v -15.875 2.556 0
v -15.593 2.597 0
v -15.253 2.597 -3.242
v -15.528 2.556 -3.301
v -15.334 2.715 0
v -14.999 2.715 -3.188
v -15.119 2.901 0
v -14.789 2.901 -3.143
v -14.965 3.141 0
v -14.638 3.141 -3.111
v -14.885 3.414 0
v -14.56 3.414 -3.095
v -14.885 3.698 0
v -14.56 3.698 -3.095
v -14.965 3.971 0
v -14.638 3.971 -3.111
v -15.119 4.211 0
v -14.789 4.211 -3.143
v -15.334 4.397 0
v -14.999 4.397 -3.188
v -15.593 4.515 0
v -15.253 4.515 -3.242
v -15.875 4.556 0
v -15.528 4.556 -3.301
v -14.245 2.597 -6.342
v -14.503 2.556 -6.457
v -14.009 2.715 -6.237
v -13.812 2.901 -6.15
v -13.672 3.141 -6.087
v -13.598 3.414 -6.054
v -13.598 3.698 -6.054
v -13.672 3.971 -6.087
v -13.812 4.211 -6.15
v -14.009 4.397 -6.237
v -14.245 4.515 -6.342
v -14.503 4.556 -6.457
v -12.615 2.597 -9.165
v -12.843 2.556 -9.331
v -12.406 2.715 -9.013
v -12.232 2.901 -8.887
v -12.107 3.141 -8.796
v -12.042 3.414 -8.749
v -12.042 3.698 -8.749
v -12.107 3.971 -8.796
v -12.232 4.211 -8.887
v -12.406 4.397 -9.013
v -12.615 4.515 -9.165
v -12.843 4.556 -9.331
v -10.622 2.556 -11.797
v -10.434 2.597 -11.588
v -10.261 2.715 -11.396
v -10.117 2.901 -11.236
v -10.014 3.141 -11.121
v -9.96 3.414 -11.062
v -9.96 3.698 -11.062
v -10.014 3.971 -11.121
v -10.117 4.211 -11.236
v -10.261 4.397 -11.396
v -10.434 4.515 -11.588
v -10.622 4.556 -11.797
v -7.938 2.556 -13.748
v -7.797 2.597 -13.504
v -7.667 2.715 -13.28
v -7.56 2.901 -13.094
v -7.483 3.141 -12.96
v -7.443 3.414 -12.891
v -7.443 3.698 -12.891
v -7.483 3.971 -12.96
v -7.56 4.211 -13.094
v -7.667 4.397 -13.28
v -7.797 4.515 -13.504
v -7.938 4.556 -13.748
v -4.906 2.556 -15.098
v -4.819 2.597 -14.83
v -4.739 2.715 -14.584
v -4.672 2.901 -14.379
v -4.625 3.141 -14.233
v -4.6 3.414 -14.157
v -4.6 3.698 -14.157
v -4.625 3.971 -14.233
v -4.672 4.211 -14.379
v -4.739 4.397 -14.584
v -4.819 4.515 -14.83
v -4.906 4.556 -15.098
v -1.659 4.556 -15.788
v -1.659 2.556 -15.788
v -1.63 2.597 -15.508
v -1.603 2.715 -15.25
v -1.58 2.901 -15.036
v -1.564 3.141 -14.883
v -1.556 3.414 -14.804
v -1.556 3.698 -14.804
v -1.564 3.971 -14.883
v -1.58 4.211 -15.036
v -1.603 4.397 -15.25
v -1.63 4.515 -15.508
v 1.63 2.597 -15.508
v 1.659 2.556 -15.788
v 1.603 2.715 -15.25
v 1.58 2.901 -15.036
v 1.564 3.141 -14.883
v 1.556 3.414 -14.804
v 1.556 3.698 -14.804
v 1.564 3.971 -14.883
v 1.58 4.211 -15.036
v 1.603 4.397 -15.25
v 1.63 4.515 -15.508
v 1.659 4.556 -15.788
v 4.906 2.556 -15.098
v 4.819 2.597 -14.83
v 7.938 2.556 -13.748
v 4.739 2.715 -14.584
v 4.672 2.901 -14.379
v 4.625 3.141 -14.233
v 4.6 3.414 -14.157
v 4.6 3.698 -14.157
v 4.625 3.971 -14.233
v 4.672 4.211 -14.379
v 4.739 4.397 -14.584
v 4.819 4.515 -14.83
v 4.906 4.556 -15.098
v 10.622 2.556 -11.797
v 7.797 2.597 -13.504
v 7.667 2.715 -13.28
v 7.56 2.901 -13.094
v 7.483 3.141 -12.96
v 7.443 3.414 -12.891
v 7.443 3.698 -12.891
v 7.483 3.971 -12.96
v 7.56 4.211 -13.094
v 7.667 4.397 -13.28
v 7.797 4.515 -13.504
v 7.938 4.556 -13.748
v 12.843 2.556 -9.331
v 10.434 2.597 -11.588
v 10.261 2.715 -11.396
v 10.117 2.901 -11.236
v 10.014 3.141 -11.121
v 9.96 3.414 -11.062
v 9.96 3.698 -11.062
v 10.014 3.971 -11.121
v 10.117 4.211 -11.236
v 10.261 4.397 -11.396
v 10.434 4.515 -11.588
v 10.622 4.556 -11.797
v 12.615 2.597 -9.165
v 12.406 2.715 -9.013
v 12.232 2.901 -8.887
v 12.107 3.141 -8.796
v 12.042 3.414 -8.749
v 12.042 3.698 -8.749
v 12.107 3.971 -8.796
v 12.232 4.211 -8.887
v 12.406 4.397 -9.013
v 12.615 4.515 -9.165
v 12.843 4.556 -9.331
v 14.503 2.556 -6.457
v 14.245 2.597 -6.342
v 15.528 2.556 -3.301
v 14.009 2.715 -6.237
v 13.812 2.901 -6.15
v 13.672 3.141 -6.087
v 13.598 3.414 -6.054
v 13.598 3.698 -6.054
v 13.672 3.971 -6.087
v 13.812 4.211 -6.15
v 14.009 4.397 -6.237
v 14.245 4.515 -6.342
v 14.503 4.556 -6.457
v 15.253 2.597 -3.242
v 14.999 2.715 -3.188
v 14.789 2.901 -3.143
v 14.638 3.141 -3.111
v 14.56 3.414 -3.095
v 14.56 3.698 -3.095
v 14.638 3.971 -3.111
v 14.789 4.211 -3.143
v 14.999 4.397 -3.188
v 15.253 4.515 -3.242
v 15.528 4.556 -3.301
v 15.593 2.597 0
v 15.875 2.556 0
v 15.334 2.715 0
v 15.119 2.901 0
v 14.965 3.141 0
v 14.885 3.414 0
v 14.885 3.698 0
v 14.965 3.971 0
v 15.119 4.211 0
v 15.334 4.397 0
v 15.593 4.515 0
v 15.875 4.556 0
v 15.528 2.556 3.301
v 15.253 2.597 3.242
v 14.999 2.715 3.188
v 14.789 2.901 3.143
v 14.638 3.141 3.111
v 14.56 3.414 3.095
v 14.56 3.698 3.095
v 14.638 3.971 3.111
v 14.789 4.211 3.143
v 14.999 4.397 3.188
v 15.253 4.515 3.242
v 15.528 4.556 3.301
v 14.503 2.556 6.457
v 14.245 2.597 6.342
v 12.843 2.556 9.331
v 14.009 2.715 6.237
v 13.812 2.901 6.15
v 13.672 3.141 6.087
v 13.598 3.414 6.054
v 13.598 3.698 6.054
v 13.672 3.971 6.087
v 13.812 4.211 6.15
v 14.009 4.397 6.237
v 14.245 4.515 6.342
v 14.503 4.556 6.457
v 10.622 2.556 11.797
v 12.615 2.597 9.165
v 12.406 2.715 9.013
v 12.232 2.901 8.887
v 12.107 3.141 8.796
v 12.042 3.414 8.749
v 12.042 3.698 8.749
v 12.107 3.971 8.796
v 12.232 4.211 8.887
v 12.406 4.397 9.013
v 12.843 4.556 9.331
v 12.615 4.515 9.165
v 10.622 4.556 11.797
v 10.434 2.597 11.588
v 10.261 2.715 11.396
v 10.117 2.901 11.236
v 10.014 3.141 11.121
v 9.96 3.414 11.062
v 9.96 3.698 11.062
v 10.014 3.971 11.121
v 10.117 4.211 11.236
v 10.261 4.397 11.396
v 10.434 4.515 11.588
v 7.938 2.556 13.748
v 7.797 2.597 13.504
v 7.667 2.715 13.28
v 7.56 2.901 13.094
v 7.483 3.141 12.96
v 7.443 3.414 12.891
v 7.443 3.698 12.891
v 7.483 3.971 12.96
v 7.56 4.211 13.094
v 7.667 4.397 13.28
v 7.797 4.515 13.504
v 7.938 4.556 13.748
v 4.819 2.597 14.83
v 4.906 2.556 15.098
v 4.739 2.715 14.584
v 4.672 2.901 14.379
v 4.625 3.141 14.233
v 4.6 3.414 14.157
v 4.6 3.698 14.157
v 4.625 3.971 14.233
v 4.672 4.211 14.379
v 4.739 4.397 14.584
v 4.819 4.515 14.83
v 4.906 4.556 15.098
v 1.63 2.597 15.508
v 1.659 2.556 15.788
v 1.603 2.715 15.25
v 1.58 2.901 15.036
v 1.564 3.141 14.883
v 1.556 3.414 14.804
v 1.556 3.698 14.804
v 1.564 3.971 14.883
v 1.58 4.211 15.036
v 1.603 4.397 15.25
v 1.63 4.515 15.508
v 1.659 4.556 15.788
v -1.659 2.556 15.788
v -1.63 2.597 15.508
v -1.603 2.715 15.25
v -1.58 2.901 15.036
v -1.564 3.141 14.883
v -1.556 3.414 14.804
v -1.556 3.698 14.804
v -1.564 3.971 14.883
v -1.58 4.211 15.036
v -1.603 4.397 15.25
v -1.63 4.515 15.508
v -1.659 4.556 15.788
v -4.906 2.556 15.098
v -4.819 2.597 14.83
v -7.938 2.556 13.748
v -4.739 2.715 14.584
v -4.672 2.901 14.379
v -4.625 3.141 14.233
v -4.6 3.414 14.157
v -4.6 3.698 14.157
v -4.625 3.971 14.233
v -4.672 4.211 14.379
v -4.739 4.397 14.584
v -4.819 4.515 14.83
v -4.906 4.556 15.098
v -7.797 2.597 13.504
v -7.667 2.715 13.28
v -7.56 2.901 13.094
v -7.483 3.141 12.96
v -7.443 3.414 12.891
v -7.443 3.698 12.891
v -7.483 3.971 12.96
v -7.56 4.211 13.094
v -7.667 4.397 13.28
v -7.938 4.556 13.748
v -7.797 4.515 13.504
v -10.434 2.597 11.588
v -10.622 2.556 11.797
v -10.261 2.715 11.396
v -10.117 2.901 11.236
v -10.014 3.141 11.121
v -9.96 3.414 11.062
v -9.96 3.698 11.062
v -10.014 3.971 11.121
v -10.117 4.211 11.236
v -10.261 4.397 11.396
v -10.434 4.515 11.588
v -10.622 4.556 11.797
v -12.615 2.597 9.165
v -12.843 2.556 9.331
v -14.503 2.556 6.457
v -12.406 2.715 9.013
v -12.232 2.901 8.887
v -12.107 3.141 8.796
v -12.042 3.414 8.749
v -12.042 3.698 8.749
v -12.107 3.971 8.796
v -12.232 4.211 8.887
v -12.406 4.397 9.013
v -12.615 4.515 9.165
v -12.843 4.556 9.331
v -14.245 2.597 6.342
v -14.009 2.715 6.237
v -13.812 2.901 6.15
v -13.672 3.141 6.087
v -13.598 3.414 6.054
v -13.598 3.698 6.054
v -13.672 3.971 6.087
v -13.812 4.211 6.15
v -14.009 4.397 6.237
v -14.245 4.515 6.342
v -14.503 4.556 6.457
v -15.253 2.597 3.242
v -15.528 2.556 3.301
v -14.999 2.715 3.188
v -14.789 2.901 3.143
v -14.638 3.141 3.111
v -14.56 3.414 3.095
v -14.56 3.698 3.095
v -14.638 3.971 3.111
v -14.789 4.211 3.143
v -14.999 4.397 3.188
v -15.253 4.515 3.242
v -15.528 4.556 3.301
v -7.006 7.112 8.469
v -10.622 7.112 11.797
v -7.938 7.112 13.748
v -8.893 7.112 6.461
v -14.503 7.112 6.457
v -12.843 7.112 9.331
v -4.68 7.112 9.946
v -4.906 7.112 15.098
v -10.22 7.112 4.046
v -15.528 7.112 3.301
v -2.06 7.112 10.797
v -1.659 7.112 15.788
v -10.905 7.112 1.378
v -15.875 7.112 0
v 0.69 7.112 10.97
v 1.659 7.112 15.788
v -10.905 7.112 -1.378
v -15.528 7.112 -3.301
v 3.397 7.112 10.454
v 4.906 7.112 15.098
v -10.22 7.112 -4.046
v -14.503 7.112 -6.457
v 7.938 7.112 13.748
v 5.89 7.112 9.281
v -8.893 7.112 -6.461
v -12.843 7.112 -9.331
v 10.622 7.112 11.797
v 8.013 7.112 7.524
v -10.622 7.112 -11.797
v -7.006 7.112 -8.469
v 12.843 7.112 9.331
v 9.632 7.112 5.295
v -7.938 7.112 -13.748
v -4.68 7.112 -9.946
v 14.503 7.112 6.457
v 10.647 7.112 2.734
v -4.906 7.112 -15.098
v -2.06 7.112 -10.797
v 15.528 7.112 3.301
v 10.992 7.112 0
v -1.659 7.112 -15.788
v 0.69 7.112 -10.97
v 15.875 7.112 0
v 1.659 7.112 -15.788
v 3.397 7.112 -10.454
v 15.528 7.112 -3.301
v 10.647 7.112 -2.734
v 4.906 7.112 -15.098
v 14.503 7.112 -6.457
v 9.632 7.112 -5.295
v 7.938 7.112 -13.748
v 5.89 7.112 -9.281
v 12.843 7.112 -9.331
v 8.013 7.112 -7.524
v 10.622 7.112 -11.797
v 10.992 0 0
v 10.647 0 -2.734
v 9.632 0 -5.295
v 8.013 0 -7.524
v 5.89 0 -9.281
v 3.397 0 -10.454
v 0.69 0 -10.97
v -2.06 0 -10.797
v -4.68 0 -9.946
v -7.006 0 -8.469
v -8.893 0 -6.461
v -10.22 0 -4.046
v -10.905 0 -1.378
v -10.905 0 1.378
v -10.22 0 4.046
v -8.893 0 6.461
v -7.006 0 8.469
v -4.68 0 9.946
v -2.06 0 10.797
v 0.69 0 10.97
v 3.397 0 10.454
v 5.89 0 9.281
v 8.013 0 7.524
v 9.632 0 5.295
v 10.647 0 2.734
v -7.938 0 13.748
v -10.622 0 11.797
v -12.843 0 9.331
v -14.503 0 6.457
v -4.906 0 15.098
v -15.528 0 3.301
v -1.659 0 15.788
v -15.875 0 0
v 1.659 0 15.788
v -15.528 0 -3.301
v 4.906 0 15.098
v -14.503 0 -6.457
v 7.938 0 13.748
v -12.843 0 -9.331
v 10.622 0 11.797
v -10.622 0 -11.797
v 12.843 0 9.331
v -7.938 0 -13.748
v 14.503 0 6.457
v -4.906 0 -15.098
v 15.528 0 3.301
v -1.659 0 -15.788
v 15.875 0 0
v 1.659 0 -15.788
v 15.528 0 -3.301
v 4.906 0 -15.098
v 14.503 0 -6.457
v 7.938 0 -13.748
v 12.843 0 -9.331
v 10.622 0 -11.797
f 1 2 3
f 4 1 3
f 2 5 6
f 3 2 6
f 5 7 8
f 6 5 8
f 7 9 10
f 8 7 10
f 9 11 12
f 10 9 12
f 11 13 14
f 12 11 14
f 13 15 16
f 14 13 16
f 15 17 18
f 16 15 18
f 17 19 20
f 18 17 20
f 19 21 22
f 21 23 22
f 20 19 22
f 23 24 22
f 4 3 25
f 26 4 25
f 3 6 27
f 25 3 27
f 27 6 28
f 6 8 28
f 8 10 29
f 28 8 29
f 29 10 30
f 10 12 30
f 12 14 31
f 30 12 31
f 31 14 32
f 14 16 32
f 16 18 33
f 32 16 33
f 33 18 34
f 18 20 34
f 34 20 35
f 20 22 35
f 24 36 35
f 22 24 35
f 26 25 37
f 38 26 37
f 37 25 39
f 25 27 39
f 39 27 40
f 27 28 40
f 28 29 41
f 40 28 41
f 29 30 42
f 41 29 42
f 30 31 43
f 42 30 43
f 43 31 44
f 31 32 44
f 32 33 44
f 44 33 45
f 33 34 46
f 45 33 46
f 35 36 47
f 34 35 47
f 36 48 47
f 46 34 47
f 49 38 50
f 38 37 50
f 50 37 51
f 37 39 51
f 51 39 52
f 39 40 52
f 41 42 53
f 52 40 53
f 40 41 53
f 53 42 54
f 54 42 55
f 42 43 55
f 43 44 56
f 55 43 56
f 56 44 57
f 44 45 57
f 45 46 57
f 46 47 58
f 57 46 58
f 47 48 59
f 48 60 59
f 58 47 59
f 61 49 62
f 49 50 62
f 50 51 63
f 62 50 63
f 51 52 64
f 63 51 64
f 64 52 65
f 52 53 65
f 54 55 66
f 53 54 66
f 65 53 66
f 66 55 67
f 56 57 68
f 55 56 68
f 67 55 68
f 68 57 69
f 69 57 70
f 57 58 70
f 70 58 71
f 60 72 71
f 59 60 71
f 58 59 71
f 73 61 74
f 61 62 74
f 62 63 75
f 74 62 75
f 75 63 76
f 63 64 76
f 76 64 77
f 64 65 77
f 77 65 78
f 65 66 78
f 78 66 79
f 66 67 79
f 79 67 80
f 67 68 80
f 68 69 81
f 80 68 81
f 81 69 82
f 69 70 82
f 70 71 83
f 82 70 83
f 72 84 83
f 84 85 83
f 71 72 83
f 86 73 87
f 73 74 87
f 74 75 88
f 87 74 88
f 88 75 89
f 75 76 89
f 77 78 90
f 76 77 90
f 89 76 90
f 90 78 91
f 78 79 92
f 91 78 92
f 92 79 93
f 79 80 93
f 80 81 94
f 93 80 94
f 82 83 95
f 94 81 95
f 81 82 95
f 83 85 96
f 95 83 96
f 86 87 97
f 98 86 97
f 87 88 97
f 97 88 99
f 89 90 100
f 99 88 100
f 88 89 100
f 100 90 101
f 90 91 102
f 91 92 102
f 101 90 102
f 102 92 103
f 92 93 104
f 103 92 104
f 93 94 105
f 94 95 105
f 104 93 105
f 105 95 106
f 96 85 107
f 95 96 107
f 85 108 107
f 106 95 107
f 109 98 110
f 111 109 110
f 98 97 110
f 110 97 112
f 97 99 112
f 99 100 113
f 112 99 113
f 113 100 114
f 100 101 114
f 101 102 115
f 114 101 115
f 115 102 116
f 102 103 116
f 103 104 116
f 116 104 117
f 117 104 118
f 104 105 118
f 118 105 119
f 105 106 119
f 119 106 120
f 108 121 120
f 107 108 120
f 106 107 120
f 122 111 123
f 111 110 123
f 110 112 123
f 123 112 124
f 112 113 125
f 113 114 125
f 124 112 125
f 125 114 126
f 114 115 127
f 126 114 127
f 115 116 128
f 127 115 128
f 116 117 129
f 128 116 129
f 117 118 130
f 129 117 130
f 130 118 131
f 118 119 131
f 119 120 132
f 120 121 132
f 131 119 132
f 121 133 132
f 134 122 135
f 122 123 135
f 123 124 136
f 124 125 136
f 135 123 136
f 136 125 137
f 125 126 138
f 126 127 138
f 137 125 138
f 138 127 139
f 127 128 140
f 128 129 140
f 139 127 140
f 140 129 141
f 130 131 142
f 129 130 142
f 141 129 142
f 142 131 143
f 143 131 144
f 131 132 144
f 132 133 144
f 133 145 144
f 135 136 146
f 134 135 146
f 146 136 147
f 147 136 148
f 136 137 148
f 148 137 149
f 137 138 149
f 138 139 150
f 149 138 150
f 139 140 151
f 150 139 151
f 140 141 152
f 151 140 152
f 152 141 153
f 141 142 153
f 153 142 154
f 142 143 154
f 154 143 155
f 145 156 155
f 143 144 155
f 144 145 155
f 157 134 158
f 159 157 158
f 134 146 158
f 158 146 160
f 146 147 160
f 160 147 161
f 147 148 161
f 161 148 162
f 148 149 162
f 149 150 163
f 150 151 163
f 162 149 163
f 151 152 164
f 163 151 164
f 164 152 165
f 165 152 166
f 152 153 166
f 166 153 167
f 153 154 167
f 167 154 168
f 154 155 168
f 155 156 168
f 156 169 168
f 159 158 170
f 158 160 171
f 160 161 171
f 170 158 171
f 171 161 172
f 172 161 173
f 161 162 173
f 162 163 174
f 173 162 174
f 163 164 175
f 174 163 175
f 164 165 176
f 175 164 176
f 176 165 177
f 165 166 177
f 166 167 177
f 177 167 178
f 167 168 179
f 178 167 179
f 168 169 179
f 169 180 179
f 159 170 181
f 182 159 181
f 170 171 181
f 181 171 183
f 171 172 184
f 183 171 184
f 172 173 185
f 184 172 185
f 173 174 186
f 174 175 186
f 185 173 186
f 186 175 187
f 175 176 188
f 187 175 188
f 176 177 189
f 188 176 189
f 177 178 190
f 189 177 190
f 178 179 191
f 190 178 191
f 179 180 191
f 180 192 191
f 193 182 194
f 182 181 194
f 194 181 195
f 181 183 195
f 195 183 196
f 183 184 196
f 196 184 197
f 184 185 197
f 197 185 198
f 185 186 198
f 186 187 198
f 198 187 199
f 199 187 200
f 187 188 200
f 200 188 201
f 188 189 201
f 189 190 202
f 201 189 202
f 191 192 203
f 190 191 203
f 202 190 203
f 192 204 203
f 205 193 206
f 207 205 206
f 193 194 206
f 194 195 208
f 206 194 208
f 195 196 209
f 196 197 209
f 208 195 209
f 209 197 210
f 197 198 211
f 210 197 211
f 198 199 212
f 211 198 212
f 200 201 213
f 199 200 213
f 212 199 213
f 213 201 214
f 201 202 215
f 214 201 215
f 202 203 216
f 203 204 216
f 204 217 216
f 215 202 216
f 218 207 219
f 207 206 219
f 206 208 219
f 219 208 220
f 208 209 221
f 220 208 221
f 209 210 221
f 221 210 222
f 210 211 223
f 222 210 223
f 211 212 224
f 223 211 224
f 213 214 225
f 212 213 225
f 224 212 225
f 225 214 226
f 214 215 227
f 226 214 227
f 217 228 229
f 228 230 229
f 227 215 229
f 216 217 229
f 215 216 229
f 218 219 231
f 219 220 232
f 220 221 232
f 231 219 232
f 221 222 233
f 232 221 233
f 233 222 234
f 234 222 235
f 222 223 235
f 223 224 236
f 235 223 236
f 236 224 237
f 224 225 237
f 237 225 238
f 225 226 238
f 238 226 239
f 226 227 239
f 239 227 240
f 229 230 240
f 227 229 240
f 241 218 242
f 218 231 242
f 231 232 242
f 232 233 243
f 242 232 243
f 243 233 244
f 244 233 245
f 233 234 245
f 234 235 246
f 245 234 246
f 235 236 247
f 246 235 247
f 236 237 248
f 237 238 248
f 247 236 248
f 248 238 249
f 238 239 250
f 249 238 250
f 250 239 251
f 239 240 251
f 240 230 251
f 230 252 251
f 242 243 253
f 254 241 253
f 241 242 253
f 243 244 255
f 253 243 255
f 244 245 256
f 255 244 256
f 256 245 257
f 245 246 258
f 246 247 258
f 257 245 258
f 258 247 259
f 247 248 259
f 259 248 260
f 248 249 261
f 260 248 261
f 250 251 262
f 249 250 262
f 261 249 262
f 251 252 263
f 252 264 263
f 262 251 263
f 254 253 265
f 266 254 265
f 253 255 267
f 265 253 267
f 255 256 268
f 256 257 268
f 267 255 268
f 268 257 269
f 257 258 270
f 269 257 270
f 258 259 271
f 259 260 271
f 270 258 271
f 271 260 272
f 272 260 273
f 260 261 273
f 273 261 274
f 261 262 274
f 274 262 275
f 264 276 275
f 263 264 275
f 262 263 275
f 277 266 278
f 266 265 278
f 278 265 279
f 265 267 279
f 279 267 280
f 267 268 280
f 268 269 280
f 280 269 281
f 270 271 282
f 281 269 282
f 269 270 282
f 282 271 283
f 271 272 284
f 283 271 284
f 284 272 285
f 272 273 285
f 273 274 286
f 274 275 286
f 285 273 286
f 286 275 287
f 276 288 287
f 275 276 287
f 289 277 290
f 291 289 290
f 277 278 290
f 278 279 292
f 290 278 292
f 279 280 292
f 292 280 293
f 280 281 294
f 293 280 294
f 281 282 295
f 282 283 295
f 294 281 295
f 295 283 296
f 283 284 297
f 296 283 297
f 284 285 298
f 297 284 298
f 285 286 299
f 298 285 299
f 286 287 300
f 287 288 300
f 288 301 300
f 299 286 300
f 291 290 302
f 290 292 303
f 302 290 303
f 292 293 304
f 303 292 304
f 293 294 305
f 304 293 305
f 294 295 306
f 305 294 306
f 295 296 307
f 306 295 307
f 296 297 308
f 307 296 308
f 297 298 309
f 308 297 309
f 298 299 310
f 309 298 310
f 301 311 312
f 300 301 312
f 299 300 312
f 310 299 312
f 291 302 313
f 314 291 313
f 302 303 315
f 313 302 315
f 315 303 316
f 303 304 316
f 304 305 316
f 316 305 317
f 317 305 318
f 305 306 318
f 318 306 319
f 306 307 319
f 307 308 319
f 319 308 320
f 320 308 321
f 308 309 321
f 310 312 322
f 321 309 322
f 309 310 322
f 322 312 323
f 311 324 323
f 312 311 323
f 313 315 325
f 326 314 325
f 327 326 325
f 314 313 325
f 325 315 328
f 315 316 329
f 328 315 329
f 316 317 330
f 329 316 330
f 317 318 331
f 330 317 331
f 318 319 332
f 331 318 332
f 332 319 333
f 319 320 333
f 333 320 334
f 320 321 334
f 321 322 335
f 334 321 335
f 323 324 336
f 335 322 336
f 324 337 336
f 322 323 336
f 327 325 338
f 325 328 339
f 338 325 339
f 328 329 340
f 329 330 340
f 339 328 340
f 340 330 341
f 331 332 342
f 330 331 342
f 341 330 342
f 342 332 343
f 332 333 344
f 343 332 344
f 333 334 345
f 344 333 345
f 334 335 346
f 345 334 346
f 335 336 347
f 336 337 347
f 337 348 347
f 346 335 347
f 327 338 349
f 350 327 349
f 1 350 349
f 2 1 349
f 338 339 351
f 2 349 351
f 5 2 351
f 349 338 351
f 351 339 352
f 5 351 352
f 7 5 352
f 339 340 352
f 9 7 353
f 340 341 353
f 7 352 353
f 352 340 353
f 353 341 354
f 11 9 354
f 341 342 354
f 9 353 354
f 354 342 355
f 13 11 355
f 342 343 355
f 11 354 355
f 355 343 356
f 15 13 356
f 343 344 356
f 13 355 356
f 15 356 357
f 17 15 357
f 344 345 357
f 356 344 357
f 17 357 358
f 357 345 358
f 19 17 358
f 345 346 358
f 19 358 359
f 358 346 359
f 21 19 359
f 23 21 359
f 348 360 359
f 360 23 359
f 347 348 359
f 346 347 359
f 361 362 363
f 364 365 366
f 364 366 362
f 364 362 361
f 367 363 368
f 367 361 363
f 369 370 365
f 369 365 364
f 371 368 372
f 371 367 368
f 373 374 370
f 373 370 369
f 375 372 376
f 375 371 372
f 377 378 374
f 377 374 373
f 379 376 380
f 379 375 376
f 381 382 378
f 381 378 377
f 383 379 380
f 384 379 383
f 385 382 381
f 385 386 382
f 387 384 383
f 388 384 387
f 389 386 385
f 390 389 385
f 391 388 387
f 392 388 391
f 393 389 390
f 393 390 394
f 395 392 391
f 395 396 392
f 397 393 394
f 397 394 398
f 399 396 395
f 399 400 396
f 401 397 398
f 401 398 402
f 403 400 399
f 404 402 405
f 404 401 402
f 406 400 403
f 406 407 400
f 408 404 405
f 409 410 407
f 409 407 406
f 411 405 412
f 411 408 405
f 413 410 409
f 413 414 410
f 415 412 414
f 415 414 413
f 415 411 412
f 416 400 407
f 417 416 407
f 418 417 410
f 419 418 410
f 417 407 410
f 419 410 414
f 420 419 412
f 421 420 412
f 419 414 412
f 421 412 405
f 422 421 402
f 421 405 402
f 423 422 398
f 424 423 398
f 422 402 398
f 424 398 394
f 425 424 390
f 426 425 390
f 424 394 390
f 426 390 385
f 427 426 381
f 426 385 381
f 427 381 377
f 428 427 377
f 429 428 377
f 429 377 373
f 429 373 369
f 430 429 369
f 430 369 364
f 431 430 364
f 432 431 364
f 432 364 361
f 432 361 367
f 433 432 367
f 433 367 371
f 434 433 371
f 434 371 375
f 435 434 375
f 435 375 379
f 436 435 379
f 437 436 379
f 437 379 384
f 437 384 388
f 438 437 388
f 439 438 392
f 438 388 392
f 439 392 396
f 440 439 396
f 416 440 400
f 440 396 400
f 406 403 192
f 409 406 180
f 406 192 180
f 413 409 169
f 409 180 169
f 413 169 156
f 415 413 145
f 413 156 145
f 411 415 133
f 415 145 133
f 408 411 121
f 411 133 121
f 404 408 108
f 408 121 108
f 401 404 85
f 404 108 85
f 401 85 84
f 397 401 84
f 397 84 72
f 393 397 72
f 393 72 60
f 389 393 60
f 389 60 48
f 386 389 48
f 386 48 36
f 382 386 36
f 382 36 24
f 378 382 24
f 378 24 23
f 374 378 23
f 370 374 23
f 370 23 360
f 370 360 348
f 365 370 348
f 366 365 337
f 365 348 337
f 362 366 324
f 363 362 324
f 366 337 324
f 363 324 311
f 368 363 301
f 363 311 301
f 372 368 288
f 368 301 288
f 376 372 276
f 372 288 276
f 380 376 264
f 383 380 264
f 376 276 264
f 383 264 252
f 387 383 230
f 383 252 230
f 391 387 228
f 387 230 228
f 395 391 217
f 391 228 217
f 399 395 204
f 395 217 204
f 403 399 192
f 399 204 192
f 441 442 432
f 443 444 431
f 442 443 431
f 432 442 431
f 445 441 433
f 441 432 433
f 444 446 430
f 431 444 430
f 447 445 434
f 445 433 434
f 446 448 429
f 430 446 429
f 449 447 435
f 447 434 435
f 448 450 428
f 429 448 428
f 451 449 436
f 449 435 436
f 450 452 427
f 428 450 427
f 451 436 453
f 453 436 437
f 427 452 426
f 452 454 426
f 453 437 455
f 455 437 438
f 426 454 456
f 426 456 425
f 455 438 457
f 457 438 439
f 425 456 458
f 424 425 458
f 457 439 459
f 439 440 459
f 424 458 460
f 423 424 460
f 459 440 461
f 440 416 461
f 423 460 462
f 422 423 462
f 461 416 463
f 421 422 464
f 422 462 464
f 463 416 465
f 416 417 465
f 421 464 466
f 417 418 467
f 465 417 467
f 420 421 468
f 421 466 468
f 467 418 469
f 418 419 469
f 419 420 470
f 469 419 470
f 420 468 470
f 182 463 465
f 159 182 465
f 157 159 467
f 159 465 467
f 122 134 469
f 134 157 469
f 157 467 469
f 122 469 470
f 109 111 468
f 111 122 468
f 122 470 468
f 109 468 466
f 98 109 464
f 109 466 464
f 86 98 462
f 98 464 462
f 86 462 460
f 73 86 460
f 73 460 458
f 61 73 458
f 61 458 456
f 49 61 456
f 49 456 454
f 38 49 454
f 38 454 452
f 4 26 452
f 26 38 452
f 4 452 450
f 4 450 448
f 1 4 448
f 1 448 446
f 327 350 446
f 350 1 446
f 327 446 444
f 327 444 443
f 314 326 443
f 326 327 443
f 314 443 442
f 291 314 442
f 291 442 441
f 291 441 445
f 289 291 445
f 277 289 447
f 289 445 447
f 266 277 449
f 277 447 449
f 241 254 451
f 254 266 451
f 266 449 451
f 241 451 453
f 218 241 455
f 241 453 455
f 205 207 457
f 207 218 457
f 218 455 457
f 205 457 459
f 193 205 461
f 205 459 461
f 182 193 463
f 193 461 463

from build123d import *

# Parameters (mm, degrees)
SKETCH1_R           = 15.875
BOSS_EXTRUDE1_DEPTH = 7.112
SKETCH3_R           = 10.99185
CUT_EXTRUDE1_DEPTH  = 10.16


with BuildPart() as part:
    # Sketch1 → Boss-Extrude1 (new body)
    with BuildSketch(Plane(origin=(0, 0, 0), x_dir=(1, 0, 0), z_dir=(0, 1, 0))):
        Circle(SKETCH1_R)
    extrude(amount=BOSS_EXTRUDE1_DEPTH)

    # Sketch2 → Cut-Revolve1 (revolve, cut)
    with BuildSketch(Plane.XY):
        with BuildLine():
            Line((-15.875, 4.556), (-15.875, 2.556))
            ThreePointArc((-15.875, 2.556), (-14.875, 3.556), (-15.875, 4.556))
        make_face()
    revolve(axis=Axis((0, 7.112, 0), (0, -1, 0)), mode=Mode.SUBTRACT)

    # Sketch3 → Cut-Extrude1 (cut)
    with BuildSketch(Plane(origin=(0, 7.112, 0), x_dir=(1, 0, 0), z_dir=(0, 1, 0))):
        Circle(SKETCH3_R)
    extrude(amount=-CUT_EXTRUDE1_DEPTH, mode=Mode.SUBTRACT)


solid = part.part
